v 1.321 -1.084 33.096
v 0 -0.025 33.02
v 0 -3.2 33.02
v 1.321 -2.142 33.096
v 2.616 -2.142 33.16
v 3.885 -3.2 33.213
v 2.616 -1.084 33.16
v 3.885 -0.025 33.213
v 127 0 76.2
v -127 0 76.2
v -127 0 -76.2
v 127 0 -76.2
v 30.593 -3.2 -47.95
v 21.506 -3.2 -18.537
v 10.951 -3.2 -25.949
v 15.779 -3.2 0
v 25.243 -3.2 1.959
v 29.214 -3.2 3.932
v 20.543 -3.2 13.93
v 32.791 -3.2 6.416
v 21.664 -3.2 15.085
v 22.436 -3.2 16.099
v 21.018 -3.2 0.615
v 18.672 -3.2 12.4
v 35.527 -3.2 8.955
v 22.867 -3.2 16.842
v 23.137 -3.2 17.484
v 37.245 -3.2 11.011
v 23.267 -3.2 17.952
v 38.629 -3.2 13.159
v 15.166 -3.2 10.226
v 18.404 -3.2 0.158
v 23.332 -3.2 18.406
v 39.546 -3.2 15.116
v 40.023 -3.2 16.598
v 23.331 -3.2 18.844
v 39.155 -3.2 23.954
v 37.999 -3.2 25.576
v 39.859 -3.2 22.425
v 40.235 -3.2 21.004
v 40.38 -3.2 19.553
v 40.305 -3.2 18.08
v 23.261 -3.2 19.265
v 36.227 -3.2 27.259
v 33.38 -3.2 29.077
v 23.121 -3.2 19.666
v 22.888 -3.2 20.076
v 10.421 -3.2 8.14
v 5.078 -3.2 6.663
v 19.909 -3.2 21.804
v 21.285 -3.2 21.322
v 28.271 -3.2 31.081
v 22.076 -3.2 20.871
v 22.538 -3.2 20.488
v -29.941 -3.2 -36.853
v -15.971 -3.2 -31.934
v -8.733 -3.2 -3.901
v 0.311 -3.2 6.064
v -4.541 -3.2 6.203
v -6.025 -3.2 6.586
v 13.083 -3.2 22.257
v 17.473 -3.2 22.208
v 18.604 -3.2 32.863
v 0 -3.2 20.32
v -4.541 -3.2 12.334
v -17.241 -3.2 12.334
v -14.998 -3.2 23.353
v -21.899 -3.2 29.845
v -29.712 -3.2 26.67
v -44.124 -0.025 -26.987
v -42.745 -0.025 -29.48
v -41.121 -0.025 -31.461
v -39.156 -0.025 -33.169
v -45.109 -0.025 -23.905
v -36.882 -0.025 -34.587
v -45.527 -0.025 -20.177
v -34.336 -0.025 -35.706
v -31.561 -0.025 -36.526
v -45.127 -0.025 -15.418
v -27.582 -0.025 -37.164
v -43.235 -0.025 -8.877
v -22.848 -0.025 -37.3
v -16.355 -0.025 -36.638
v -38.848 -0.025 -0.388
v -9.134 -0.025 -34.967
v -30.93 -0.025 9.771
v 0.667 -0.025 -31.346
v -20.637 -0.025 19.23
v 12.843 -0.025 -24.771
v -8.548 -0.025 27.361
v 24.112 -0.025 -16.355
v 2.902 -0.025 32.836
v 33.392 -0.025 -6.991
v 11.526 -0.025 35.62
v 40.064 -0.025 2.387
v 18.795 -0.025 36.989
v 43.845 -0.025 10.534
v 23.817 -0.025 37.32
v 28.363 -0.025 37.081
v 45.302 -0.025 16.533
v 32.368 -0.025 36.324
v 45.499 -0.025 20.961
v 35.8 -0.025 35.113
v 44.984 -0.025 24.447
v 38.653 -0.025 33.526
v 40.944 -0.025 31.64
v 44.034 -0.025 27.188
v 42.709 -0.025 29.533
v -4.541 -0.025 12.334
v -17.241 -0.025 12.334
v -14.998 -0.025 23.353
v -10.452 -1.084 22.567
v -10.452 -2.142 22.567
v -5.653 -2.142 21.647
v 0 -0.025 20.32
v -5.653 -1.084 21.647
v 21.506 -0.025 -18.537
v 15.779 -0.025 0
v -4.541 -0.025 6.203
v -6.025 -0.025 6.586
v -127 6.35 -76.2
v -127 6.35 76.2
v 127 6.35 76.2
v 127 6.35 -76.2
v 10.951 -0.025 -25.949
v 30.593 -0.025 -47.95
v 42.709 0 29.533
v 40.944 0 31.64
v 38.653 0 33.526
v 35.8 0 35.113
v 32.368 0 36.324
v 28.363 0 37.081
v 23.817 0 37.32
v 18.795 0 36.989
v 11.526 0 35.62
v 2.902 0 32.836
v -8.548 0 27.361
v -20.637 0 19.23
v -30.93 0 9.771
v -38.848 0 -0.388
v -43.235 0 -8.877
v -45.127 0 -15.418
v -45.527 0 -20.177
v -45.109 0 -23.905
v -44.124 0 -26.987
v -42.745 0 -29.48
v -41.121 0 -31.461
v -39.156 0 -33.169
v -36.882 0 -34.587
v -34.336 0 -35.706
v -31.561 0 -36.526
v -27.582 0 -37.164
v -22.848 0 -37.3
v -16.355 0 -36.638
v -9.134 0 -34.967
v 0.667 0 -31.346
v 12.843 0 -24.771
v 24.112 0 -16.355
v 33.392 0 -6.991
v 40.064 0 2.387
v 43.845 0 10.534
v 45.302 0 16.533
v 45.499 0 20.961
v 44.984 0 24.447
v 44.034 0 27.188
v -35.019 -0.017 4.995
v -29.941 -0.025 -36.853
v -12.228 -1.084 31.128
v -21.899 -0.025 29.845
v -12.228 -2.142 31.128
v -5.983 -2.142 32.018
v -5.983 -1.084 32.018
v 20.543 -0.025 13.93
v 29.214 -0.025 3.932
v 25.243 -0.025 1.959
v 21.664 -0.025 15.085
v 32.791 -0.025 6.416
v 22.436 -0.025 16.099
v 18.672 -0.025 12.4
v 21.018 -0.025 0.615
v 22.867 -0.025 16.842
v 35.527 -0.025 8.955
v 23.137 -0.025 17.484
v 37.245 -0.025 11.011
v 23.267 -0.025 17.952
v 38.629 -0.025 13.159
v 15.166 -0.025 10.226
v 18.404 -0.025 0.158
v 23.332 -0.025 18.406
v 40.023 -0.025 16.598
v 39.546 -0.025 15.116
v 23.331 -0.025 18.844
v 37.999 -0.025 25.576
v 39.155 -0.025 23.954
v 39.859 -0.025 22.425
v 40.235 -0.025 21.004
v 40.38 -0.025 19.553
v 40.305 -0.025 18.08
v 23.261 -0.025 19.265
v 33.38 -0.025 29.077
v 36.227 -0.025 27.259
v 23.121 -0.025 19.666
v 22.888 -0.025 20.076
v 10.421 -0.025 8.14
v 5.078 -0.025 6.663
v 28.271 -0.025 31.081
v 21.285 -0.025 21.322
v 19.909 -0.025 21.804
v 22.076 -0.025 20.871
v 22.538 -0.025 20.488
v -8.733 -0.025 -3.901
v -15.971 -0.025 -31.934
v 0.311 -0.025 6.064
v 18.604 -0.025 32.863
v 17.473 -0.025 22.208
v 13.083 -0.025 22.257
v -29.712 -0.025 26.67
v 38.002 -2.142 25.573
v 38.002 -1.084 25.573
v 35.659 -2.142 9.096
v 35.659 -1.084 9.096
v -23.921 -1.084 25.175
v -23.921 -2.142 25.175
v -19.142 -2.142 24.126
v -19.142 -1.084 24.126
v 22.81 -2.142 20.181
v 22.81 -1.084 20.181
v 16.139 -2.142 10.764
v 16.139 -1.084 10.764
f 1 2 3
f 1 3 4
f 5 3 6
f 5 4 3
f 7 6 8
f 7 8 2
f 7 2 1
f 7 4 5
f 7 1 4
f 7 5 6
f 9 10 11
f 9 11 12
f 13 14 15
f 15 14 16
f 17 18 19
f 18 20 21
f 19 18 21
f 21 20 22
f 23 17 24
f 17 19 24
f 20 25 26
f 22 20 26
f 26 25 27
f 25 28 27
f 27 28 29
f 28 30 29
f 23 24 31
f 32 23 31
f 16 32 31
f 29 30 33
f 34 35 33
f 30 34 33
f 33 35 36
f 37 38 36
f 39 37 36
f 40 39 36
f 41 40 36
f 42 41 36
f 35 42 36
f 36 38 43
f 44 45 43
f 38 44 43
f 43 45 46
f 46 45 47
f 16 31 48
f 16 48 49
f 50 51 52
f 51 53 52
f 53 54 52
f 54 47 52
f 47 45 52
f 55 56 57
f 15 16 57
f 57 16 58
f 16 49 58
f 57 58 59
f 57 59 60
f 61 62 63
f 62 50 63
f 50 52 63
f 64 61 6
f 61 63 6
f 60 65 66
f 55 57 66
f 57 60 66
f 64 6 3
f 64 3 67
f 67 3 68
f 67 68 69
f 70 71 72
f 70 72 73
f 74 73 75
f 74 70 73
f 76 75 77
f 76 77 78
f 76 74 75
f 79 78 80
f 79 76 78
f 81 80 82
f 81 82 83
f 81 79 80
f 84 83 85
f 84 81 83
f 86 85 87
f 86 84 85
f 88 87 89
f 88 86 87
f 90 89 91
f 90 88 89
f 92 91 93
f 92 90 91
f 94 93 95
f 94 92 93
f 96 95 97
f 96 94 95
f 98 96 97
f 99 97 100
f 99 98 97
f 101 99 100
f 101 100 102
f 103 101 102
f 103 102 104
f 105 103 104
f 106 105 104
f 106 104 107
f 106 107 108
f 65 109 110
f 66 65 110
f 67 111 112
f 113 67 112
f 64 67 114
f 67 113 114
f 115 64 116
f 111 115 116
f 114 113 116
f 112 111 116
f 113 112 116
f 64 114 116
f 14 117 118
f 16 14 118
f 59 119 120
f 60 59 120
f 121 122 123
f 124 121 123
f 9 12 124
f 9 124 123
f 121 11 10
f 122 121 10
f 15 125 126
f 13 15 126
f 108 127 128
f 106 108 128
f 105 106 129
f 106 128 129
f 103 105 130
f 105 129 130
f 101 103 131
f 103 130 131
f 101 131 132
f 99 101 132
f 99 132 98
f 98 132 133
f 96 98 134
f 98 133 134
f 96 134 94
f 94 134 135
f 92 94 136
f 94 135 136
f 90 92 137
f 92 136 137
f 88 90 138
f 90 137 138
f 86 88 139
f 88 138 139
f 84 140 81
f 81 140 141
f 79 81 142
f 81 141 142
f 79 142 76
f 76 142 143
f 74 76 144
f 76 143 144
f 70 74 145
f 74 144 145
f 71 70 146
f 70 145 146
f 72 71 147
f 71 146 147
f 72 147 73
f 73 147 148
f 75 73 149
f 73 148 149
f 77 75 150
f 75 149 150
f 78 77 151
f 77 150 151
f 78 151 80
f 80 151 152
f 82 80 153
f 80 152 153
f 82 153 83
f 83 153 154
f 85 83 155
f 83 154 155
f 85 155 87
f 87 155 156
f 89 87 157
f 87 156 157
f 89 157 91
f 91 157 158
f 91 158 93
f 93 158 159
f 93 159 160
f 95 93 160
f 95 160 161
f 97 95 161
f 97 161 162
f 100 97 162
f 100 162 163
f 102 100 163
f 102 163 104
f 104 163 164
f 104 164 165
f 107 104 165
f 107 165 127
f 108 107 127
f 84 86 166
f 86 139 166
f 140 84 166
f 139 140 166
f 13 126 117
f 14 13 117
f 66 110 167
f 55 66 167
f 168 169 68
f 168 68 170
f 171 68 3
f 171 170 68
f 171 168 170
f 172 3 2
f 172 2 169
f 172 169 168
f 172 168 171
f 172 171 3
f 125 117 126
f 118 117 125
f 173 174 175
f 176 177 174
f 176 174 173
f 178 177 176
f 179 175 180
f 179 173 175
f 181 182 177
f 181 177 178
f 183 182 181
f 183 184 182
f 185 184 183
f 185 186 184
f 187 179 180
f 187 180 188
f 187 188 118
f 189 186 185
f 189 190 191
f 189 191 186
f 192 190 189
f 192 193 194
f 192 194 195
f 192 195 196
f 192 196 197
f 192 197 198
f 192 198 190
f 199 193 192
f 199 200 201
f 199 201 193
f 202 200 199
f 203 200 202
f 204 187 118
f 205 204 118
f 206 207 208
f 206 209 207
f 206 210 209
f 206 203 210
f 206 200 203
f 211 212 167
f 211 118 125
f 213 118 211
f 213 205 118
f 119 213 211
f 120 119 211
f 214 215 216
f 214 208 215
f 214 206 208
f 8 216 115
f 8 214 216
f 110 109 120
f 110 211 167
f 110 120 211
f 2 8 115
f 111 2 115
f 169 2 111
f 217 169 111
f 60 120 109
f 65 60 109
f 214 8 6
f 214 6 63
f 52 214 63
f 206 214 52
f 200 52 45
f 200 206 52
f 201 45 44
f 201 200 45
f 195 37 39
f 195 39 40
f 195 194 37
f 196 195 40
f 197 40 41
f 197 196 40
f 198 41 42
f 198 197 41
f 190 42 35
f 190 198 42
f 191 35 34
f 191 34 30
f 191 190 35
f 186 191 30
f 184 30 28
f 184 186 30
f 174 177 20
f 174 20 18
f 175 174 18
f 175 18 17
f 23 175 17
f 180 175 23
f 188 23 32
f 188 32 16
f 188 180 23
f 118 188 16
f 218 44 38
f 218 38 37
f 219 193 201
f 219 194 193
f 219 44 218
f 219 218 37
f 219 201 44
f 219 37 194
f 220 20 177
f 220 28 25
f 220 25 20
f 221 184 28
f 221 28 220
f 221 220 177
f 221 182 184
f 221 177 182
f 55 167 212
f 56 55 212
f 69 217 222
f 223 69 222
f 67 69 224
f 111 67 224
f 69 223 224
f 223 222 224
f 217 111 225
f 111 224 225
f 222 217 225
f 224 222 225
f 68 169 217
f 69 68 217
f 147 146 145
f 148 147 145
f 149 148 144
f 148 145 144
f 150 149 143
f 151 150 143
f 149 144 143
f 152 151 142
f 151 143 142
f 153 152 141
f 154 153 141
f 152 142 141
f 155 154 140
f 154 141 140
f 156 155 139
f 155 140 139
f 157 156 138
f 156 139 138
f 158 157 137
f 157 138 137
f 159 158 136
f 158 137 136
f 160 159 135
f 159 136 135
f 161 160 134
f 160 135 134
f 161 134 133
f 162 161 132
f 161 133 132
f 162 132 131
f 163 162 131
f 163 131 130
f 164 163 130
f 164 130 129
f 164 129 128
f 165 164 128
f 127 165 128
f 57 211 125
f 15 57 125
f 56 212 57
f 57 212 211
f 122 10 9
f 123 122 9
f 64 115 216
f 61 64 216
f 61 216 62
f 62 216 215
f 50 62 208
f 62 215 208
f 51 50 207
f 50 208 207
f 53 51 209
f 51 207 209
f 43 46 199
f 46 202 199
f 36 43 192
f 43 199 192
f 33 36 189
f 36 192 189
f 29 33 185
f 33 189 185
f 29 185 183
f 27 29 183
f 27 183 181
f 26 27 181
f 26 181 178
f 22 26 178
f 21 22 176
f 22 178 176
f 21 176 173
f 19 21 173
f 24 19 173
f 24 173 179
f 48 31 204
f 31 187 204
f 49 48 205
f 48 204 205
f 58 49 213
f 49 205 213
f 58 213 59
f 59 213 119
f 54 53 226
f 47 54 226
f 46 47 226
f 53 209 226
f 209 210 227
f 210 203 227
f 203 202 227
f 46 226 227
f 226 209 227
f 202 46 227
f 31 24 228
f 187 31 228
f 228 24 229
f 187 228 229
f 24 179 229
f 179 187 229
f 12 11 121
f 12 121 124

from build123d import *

# Parameters (mm, degrees)
F0_W     = 254
F0_H     = 152.4
F1_DEPTH = 6.35
F3_DEPTH = 0.0254
F5_DEPTH = 3.175


# Not quite as in the source:
# - a feature names something its author has since deleted; it is built from what else it names


with BuildPart() as f1:
    # F0 (on Front) → F1 (new body)
    with BuildSketch(Plane.XZ):
        Rectangle(F0_W, F0_H)
    extrude(amount=-F1_DEPTH)


with BuildPart() as f3:
    # F2 (on face) → F3 (new body)
    with BuildSketch(Plane.XZ):
        with BuildLine():
            add(Edge.make_bspline(
                [(42.7089780569, 29.5328665525), (15.3792632005, 69.0557550614), (-35.0193464566, 4.9950109782), (-85.4179561138, -59.0657331049), (-7.6896316003, -34.5278775307), (70.0386929133, -9.9900219565), (42.7089780569, 29.5328665525)],
                knots=[0, 0, 0, 2.0943951024, 2.0943951024, 4.1887902048, 4.1887902048, 6.2831853072, 6.2831853072, 6.2831853072], degree=2, weights=[1, 0.5, 1, 0.5, 1, 0.5, 1]))
        make_face()
    extrude(amount=F3_DEPTH)


with BuildPart() as f5:
    # F4 (on face) → F5 (new body)
    with BuildSketch(Plane.XZ.offset(0.0254)):
        with BuildLine():
            add(Edge.make_bspline(
                [(10.9512705407, -25.9492226202), (16.4828155374, -22.5918140848), (21.5058742199, -18.537459797)],
                knots=[4.6403572647, 4.6403572647, 4.6403572647, 4.8819348749, 4.8819348749, 4.8819348749], degree=2, weights=[0.8308791571, 0.7980759448, 0.7785771582]))
            Line((10.9512705407, -25.9492226202), (30.5927571669, -47.9500807992))
            Line((30.5927571669, -47.9500807992), (21.5058742199, -18.537459797))
        make_face()
        with BuildLine():
            Line((0, 33.02), (0, 31.6392348733))
            add(Edge.make_bspline(
                [(3.8851219863, 33.2129324059), (1.946109979, 32.4853248752), (0, 31.6392348733)],
                knots=[1.1236663731, 1.1236663731, 1.1236663731, 1.2014715695, 1.2014715695, 1.2014715695], degree=2, weights=[0.7513330658, 0.7526894283, 0.7554258571]))
            add(Edge.make_bspline(
                [(0, 33.02), (1.3337301063, 33.1020404773), (2.6284916435, 33.1661120443), (3.8851219863, 33.2129324059)],
                knots=[0, 0, 0, 0, 0.7676114314, 0.7676114314, 0.7676114314, 0.7676114314], degree=3))
        make_face()
        with BuildLine():
            Line((-8.7328994515, -3.9005538706), (10.9512705407, -25.9492226202))
            add(Edge.make_bspline(
                [(10.9512705407, -25.9492226202), (16.4828155374, -22.5918140848), (21.5058742199, -18.537459797)],
                knots=[4.6403572647, 4.6403572647, 4.6403572647, 4.8819348749, 4.8819348749, 4.8819348749], degree=2, weights=[0.8308791571, 0.7980759448, 0.7785771582]))
            Line((21.5058742199, -18.537459797), (15.7788182292, 0))
            add(Edge.make_bspline(
                [(3.8851219863, 33.2129324059), (62.53909114, 35.3983006502), (38.1200136526, 0), (15.7788182292, 0)],
                knots=[0.7676114314, 0.7676114314, 0.7676114314, 0.7676114314, 36.5963318477, 36.5963318477, 36.5963318477, 36.5963318477], degree=3))
            add(Edge.make_bspline(
                [(3.8851219863, 33.2129324059), (1.946109979, 32.4853248752), (0, 31.6392348733)],
                knots=[1.1236663731, 1.1236663731, 1.1236663731, 1.2014715695, 1.2014715695, 1.2014715695], degree=2, weights=[0.7513330658, 0.7526894283, 0.7554258571]))
            Line((0, 31.6392348733), (0, 20.32))
            add(Edge.make_bspline(
                [(0, 20.32), (42.7089780569, 29.5328665525), (17.9859120399, 3.6229274701), (-4.5411817708, 6.2032266552)],
                knots=[0, 0, 0, 0, 14.8292151358, 14.8292151358, 14.8292151358, 14.8292151358], degree=3))
            Line((-4.5411817708, 6.2032266552), (-6.0251812396, 6.5863936705))
            Line((-6.0251812396, 6.5863936705), (-8.7328994515, -3.9005538706))
        make_face()
        Polygon((-17.2411817708, 12.3338988988), (-29.9411817708, -36.852989598), (-15.9711817708, -31.9343007483), (-8.7328994515, -3.9005538706), (-6.0251812396, 6.5863936705), (-4.5411817708, 12.3338988988), align=None)
        with BuildLine():
            add(Edge.make_bspline(
                [(0, 31.6392348733), (-7.71435254, 28.2853460255), (-14.9981473119, 23.3527795901)],
                knots=[1.2014715695, 1.2014715695, 1.2014715695, 1.5155376104, 1.5155376104, 1.5155376104], degree=2, weights=[0.7554258571, 0.7664716411, 0.8000040736]))
            add(Edge.make_bspline(
                [(-14.9981473119, 23.3527795901), (-10.3762713203, 22.5418478133), (-6.2820866899, 21.9425380061), (0, 20.32)],
                knots=[14.0059934649, 14.0059934649, 14.0059934649, 14.0059934649, 30.3833855243, 30.3833855243, 30.3833855243, 30.3833855243], degree=3))
            Line((0, 20.32), (0, 31.6392348733))
        make_face()
        with BuildLine():
            add(Edge.make_bspline(
                [(-29.7124151815, 26.67), (-23.2893696753, 24.8945764216), (-18.9507891427, 24.0462908112), (-14.9981473119, 23.3527795901)],
                knots=[0, 0, 0, 0, 14.0059934649, 14.0059934649, 14.0059934649, 14.0059934649], degree=3))
            add(Edge.make_bspline(
                [(0, 31.6392348733), (-7.71435254, 28.2853460255), (-14.9981473119, 23.3527795901)],
                knots=[1.2014715695, 1.2014715695, 1.2014715695, 1.5155376104, 1.5155376104, 1.5155376104], degree=2, weights=[0.7554258571, 0.7664716411, 0.8000040736]))
            Line((0, 31.6392348733), (0, 33.02))
            add(Edge.make_bspline(
                [(-21.8985817649, 29.845), (-9.461321868, 31.493146081), (-6.9059981033, 31.7937714201), (0, 33.02)],
                knots=[0, 0, 0, 0, 22.1275508883, 22.1275508883, 22.1275508883, 22.1275508883], degree=3))
            Line((-21.8985817649, 29.845), (-29.7124151815, 26.67))
        make_face()
    extrude(amount=F5_DEPTH)


solid = Compound([f1.part, f3.part, f5.part])
